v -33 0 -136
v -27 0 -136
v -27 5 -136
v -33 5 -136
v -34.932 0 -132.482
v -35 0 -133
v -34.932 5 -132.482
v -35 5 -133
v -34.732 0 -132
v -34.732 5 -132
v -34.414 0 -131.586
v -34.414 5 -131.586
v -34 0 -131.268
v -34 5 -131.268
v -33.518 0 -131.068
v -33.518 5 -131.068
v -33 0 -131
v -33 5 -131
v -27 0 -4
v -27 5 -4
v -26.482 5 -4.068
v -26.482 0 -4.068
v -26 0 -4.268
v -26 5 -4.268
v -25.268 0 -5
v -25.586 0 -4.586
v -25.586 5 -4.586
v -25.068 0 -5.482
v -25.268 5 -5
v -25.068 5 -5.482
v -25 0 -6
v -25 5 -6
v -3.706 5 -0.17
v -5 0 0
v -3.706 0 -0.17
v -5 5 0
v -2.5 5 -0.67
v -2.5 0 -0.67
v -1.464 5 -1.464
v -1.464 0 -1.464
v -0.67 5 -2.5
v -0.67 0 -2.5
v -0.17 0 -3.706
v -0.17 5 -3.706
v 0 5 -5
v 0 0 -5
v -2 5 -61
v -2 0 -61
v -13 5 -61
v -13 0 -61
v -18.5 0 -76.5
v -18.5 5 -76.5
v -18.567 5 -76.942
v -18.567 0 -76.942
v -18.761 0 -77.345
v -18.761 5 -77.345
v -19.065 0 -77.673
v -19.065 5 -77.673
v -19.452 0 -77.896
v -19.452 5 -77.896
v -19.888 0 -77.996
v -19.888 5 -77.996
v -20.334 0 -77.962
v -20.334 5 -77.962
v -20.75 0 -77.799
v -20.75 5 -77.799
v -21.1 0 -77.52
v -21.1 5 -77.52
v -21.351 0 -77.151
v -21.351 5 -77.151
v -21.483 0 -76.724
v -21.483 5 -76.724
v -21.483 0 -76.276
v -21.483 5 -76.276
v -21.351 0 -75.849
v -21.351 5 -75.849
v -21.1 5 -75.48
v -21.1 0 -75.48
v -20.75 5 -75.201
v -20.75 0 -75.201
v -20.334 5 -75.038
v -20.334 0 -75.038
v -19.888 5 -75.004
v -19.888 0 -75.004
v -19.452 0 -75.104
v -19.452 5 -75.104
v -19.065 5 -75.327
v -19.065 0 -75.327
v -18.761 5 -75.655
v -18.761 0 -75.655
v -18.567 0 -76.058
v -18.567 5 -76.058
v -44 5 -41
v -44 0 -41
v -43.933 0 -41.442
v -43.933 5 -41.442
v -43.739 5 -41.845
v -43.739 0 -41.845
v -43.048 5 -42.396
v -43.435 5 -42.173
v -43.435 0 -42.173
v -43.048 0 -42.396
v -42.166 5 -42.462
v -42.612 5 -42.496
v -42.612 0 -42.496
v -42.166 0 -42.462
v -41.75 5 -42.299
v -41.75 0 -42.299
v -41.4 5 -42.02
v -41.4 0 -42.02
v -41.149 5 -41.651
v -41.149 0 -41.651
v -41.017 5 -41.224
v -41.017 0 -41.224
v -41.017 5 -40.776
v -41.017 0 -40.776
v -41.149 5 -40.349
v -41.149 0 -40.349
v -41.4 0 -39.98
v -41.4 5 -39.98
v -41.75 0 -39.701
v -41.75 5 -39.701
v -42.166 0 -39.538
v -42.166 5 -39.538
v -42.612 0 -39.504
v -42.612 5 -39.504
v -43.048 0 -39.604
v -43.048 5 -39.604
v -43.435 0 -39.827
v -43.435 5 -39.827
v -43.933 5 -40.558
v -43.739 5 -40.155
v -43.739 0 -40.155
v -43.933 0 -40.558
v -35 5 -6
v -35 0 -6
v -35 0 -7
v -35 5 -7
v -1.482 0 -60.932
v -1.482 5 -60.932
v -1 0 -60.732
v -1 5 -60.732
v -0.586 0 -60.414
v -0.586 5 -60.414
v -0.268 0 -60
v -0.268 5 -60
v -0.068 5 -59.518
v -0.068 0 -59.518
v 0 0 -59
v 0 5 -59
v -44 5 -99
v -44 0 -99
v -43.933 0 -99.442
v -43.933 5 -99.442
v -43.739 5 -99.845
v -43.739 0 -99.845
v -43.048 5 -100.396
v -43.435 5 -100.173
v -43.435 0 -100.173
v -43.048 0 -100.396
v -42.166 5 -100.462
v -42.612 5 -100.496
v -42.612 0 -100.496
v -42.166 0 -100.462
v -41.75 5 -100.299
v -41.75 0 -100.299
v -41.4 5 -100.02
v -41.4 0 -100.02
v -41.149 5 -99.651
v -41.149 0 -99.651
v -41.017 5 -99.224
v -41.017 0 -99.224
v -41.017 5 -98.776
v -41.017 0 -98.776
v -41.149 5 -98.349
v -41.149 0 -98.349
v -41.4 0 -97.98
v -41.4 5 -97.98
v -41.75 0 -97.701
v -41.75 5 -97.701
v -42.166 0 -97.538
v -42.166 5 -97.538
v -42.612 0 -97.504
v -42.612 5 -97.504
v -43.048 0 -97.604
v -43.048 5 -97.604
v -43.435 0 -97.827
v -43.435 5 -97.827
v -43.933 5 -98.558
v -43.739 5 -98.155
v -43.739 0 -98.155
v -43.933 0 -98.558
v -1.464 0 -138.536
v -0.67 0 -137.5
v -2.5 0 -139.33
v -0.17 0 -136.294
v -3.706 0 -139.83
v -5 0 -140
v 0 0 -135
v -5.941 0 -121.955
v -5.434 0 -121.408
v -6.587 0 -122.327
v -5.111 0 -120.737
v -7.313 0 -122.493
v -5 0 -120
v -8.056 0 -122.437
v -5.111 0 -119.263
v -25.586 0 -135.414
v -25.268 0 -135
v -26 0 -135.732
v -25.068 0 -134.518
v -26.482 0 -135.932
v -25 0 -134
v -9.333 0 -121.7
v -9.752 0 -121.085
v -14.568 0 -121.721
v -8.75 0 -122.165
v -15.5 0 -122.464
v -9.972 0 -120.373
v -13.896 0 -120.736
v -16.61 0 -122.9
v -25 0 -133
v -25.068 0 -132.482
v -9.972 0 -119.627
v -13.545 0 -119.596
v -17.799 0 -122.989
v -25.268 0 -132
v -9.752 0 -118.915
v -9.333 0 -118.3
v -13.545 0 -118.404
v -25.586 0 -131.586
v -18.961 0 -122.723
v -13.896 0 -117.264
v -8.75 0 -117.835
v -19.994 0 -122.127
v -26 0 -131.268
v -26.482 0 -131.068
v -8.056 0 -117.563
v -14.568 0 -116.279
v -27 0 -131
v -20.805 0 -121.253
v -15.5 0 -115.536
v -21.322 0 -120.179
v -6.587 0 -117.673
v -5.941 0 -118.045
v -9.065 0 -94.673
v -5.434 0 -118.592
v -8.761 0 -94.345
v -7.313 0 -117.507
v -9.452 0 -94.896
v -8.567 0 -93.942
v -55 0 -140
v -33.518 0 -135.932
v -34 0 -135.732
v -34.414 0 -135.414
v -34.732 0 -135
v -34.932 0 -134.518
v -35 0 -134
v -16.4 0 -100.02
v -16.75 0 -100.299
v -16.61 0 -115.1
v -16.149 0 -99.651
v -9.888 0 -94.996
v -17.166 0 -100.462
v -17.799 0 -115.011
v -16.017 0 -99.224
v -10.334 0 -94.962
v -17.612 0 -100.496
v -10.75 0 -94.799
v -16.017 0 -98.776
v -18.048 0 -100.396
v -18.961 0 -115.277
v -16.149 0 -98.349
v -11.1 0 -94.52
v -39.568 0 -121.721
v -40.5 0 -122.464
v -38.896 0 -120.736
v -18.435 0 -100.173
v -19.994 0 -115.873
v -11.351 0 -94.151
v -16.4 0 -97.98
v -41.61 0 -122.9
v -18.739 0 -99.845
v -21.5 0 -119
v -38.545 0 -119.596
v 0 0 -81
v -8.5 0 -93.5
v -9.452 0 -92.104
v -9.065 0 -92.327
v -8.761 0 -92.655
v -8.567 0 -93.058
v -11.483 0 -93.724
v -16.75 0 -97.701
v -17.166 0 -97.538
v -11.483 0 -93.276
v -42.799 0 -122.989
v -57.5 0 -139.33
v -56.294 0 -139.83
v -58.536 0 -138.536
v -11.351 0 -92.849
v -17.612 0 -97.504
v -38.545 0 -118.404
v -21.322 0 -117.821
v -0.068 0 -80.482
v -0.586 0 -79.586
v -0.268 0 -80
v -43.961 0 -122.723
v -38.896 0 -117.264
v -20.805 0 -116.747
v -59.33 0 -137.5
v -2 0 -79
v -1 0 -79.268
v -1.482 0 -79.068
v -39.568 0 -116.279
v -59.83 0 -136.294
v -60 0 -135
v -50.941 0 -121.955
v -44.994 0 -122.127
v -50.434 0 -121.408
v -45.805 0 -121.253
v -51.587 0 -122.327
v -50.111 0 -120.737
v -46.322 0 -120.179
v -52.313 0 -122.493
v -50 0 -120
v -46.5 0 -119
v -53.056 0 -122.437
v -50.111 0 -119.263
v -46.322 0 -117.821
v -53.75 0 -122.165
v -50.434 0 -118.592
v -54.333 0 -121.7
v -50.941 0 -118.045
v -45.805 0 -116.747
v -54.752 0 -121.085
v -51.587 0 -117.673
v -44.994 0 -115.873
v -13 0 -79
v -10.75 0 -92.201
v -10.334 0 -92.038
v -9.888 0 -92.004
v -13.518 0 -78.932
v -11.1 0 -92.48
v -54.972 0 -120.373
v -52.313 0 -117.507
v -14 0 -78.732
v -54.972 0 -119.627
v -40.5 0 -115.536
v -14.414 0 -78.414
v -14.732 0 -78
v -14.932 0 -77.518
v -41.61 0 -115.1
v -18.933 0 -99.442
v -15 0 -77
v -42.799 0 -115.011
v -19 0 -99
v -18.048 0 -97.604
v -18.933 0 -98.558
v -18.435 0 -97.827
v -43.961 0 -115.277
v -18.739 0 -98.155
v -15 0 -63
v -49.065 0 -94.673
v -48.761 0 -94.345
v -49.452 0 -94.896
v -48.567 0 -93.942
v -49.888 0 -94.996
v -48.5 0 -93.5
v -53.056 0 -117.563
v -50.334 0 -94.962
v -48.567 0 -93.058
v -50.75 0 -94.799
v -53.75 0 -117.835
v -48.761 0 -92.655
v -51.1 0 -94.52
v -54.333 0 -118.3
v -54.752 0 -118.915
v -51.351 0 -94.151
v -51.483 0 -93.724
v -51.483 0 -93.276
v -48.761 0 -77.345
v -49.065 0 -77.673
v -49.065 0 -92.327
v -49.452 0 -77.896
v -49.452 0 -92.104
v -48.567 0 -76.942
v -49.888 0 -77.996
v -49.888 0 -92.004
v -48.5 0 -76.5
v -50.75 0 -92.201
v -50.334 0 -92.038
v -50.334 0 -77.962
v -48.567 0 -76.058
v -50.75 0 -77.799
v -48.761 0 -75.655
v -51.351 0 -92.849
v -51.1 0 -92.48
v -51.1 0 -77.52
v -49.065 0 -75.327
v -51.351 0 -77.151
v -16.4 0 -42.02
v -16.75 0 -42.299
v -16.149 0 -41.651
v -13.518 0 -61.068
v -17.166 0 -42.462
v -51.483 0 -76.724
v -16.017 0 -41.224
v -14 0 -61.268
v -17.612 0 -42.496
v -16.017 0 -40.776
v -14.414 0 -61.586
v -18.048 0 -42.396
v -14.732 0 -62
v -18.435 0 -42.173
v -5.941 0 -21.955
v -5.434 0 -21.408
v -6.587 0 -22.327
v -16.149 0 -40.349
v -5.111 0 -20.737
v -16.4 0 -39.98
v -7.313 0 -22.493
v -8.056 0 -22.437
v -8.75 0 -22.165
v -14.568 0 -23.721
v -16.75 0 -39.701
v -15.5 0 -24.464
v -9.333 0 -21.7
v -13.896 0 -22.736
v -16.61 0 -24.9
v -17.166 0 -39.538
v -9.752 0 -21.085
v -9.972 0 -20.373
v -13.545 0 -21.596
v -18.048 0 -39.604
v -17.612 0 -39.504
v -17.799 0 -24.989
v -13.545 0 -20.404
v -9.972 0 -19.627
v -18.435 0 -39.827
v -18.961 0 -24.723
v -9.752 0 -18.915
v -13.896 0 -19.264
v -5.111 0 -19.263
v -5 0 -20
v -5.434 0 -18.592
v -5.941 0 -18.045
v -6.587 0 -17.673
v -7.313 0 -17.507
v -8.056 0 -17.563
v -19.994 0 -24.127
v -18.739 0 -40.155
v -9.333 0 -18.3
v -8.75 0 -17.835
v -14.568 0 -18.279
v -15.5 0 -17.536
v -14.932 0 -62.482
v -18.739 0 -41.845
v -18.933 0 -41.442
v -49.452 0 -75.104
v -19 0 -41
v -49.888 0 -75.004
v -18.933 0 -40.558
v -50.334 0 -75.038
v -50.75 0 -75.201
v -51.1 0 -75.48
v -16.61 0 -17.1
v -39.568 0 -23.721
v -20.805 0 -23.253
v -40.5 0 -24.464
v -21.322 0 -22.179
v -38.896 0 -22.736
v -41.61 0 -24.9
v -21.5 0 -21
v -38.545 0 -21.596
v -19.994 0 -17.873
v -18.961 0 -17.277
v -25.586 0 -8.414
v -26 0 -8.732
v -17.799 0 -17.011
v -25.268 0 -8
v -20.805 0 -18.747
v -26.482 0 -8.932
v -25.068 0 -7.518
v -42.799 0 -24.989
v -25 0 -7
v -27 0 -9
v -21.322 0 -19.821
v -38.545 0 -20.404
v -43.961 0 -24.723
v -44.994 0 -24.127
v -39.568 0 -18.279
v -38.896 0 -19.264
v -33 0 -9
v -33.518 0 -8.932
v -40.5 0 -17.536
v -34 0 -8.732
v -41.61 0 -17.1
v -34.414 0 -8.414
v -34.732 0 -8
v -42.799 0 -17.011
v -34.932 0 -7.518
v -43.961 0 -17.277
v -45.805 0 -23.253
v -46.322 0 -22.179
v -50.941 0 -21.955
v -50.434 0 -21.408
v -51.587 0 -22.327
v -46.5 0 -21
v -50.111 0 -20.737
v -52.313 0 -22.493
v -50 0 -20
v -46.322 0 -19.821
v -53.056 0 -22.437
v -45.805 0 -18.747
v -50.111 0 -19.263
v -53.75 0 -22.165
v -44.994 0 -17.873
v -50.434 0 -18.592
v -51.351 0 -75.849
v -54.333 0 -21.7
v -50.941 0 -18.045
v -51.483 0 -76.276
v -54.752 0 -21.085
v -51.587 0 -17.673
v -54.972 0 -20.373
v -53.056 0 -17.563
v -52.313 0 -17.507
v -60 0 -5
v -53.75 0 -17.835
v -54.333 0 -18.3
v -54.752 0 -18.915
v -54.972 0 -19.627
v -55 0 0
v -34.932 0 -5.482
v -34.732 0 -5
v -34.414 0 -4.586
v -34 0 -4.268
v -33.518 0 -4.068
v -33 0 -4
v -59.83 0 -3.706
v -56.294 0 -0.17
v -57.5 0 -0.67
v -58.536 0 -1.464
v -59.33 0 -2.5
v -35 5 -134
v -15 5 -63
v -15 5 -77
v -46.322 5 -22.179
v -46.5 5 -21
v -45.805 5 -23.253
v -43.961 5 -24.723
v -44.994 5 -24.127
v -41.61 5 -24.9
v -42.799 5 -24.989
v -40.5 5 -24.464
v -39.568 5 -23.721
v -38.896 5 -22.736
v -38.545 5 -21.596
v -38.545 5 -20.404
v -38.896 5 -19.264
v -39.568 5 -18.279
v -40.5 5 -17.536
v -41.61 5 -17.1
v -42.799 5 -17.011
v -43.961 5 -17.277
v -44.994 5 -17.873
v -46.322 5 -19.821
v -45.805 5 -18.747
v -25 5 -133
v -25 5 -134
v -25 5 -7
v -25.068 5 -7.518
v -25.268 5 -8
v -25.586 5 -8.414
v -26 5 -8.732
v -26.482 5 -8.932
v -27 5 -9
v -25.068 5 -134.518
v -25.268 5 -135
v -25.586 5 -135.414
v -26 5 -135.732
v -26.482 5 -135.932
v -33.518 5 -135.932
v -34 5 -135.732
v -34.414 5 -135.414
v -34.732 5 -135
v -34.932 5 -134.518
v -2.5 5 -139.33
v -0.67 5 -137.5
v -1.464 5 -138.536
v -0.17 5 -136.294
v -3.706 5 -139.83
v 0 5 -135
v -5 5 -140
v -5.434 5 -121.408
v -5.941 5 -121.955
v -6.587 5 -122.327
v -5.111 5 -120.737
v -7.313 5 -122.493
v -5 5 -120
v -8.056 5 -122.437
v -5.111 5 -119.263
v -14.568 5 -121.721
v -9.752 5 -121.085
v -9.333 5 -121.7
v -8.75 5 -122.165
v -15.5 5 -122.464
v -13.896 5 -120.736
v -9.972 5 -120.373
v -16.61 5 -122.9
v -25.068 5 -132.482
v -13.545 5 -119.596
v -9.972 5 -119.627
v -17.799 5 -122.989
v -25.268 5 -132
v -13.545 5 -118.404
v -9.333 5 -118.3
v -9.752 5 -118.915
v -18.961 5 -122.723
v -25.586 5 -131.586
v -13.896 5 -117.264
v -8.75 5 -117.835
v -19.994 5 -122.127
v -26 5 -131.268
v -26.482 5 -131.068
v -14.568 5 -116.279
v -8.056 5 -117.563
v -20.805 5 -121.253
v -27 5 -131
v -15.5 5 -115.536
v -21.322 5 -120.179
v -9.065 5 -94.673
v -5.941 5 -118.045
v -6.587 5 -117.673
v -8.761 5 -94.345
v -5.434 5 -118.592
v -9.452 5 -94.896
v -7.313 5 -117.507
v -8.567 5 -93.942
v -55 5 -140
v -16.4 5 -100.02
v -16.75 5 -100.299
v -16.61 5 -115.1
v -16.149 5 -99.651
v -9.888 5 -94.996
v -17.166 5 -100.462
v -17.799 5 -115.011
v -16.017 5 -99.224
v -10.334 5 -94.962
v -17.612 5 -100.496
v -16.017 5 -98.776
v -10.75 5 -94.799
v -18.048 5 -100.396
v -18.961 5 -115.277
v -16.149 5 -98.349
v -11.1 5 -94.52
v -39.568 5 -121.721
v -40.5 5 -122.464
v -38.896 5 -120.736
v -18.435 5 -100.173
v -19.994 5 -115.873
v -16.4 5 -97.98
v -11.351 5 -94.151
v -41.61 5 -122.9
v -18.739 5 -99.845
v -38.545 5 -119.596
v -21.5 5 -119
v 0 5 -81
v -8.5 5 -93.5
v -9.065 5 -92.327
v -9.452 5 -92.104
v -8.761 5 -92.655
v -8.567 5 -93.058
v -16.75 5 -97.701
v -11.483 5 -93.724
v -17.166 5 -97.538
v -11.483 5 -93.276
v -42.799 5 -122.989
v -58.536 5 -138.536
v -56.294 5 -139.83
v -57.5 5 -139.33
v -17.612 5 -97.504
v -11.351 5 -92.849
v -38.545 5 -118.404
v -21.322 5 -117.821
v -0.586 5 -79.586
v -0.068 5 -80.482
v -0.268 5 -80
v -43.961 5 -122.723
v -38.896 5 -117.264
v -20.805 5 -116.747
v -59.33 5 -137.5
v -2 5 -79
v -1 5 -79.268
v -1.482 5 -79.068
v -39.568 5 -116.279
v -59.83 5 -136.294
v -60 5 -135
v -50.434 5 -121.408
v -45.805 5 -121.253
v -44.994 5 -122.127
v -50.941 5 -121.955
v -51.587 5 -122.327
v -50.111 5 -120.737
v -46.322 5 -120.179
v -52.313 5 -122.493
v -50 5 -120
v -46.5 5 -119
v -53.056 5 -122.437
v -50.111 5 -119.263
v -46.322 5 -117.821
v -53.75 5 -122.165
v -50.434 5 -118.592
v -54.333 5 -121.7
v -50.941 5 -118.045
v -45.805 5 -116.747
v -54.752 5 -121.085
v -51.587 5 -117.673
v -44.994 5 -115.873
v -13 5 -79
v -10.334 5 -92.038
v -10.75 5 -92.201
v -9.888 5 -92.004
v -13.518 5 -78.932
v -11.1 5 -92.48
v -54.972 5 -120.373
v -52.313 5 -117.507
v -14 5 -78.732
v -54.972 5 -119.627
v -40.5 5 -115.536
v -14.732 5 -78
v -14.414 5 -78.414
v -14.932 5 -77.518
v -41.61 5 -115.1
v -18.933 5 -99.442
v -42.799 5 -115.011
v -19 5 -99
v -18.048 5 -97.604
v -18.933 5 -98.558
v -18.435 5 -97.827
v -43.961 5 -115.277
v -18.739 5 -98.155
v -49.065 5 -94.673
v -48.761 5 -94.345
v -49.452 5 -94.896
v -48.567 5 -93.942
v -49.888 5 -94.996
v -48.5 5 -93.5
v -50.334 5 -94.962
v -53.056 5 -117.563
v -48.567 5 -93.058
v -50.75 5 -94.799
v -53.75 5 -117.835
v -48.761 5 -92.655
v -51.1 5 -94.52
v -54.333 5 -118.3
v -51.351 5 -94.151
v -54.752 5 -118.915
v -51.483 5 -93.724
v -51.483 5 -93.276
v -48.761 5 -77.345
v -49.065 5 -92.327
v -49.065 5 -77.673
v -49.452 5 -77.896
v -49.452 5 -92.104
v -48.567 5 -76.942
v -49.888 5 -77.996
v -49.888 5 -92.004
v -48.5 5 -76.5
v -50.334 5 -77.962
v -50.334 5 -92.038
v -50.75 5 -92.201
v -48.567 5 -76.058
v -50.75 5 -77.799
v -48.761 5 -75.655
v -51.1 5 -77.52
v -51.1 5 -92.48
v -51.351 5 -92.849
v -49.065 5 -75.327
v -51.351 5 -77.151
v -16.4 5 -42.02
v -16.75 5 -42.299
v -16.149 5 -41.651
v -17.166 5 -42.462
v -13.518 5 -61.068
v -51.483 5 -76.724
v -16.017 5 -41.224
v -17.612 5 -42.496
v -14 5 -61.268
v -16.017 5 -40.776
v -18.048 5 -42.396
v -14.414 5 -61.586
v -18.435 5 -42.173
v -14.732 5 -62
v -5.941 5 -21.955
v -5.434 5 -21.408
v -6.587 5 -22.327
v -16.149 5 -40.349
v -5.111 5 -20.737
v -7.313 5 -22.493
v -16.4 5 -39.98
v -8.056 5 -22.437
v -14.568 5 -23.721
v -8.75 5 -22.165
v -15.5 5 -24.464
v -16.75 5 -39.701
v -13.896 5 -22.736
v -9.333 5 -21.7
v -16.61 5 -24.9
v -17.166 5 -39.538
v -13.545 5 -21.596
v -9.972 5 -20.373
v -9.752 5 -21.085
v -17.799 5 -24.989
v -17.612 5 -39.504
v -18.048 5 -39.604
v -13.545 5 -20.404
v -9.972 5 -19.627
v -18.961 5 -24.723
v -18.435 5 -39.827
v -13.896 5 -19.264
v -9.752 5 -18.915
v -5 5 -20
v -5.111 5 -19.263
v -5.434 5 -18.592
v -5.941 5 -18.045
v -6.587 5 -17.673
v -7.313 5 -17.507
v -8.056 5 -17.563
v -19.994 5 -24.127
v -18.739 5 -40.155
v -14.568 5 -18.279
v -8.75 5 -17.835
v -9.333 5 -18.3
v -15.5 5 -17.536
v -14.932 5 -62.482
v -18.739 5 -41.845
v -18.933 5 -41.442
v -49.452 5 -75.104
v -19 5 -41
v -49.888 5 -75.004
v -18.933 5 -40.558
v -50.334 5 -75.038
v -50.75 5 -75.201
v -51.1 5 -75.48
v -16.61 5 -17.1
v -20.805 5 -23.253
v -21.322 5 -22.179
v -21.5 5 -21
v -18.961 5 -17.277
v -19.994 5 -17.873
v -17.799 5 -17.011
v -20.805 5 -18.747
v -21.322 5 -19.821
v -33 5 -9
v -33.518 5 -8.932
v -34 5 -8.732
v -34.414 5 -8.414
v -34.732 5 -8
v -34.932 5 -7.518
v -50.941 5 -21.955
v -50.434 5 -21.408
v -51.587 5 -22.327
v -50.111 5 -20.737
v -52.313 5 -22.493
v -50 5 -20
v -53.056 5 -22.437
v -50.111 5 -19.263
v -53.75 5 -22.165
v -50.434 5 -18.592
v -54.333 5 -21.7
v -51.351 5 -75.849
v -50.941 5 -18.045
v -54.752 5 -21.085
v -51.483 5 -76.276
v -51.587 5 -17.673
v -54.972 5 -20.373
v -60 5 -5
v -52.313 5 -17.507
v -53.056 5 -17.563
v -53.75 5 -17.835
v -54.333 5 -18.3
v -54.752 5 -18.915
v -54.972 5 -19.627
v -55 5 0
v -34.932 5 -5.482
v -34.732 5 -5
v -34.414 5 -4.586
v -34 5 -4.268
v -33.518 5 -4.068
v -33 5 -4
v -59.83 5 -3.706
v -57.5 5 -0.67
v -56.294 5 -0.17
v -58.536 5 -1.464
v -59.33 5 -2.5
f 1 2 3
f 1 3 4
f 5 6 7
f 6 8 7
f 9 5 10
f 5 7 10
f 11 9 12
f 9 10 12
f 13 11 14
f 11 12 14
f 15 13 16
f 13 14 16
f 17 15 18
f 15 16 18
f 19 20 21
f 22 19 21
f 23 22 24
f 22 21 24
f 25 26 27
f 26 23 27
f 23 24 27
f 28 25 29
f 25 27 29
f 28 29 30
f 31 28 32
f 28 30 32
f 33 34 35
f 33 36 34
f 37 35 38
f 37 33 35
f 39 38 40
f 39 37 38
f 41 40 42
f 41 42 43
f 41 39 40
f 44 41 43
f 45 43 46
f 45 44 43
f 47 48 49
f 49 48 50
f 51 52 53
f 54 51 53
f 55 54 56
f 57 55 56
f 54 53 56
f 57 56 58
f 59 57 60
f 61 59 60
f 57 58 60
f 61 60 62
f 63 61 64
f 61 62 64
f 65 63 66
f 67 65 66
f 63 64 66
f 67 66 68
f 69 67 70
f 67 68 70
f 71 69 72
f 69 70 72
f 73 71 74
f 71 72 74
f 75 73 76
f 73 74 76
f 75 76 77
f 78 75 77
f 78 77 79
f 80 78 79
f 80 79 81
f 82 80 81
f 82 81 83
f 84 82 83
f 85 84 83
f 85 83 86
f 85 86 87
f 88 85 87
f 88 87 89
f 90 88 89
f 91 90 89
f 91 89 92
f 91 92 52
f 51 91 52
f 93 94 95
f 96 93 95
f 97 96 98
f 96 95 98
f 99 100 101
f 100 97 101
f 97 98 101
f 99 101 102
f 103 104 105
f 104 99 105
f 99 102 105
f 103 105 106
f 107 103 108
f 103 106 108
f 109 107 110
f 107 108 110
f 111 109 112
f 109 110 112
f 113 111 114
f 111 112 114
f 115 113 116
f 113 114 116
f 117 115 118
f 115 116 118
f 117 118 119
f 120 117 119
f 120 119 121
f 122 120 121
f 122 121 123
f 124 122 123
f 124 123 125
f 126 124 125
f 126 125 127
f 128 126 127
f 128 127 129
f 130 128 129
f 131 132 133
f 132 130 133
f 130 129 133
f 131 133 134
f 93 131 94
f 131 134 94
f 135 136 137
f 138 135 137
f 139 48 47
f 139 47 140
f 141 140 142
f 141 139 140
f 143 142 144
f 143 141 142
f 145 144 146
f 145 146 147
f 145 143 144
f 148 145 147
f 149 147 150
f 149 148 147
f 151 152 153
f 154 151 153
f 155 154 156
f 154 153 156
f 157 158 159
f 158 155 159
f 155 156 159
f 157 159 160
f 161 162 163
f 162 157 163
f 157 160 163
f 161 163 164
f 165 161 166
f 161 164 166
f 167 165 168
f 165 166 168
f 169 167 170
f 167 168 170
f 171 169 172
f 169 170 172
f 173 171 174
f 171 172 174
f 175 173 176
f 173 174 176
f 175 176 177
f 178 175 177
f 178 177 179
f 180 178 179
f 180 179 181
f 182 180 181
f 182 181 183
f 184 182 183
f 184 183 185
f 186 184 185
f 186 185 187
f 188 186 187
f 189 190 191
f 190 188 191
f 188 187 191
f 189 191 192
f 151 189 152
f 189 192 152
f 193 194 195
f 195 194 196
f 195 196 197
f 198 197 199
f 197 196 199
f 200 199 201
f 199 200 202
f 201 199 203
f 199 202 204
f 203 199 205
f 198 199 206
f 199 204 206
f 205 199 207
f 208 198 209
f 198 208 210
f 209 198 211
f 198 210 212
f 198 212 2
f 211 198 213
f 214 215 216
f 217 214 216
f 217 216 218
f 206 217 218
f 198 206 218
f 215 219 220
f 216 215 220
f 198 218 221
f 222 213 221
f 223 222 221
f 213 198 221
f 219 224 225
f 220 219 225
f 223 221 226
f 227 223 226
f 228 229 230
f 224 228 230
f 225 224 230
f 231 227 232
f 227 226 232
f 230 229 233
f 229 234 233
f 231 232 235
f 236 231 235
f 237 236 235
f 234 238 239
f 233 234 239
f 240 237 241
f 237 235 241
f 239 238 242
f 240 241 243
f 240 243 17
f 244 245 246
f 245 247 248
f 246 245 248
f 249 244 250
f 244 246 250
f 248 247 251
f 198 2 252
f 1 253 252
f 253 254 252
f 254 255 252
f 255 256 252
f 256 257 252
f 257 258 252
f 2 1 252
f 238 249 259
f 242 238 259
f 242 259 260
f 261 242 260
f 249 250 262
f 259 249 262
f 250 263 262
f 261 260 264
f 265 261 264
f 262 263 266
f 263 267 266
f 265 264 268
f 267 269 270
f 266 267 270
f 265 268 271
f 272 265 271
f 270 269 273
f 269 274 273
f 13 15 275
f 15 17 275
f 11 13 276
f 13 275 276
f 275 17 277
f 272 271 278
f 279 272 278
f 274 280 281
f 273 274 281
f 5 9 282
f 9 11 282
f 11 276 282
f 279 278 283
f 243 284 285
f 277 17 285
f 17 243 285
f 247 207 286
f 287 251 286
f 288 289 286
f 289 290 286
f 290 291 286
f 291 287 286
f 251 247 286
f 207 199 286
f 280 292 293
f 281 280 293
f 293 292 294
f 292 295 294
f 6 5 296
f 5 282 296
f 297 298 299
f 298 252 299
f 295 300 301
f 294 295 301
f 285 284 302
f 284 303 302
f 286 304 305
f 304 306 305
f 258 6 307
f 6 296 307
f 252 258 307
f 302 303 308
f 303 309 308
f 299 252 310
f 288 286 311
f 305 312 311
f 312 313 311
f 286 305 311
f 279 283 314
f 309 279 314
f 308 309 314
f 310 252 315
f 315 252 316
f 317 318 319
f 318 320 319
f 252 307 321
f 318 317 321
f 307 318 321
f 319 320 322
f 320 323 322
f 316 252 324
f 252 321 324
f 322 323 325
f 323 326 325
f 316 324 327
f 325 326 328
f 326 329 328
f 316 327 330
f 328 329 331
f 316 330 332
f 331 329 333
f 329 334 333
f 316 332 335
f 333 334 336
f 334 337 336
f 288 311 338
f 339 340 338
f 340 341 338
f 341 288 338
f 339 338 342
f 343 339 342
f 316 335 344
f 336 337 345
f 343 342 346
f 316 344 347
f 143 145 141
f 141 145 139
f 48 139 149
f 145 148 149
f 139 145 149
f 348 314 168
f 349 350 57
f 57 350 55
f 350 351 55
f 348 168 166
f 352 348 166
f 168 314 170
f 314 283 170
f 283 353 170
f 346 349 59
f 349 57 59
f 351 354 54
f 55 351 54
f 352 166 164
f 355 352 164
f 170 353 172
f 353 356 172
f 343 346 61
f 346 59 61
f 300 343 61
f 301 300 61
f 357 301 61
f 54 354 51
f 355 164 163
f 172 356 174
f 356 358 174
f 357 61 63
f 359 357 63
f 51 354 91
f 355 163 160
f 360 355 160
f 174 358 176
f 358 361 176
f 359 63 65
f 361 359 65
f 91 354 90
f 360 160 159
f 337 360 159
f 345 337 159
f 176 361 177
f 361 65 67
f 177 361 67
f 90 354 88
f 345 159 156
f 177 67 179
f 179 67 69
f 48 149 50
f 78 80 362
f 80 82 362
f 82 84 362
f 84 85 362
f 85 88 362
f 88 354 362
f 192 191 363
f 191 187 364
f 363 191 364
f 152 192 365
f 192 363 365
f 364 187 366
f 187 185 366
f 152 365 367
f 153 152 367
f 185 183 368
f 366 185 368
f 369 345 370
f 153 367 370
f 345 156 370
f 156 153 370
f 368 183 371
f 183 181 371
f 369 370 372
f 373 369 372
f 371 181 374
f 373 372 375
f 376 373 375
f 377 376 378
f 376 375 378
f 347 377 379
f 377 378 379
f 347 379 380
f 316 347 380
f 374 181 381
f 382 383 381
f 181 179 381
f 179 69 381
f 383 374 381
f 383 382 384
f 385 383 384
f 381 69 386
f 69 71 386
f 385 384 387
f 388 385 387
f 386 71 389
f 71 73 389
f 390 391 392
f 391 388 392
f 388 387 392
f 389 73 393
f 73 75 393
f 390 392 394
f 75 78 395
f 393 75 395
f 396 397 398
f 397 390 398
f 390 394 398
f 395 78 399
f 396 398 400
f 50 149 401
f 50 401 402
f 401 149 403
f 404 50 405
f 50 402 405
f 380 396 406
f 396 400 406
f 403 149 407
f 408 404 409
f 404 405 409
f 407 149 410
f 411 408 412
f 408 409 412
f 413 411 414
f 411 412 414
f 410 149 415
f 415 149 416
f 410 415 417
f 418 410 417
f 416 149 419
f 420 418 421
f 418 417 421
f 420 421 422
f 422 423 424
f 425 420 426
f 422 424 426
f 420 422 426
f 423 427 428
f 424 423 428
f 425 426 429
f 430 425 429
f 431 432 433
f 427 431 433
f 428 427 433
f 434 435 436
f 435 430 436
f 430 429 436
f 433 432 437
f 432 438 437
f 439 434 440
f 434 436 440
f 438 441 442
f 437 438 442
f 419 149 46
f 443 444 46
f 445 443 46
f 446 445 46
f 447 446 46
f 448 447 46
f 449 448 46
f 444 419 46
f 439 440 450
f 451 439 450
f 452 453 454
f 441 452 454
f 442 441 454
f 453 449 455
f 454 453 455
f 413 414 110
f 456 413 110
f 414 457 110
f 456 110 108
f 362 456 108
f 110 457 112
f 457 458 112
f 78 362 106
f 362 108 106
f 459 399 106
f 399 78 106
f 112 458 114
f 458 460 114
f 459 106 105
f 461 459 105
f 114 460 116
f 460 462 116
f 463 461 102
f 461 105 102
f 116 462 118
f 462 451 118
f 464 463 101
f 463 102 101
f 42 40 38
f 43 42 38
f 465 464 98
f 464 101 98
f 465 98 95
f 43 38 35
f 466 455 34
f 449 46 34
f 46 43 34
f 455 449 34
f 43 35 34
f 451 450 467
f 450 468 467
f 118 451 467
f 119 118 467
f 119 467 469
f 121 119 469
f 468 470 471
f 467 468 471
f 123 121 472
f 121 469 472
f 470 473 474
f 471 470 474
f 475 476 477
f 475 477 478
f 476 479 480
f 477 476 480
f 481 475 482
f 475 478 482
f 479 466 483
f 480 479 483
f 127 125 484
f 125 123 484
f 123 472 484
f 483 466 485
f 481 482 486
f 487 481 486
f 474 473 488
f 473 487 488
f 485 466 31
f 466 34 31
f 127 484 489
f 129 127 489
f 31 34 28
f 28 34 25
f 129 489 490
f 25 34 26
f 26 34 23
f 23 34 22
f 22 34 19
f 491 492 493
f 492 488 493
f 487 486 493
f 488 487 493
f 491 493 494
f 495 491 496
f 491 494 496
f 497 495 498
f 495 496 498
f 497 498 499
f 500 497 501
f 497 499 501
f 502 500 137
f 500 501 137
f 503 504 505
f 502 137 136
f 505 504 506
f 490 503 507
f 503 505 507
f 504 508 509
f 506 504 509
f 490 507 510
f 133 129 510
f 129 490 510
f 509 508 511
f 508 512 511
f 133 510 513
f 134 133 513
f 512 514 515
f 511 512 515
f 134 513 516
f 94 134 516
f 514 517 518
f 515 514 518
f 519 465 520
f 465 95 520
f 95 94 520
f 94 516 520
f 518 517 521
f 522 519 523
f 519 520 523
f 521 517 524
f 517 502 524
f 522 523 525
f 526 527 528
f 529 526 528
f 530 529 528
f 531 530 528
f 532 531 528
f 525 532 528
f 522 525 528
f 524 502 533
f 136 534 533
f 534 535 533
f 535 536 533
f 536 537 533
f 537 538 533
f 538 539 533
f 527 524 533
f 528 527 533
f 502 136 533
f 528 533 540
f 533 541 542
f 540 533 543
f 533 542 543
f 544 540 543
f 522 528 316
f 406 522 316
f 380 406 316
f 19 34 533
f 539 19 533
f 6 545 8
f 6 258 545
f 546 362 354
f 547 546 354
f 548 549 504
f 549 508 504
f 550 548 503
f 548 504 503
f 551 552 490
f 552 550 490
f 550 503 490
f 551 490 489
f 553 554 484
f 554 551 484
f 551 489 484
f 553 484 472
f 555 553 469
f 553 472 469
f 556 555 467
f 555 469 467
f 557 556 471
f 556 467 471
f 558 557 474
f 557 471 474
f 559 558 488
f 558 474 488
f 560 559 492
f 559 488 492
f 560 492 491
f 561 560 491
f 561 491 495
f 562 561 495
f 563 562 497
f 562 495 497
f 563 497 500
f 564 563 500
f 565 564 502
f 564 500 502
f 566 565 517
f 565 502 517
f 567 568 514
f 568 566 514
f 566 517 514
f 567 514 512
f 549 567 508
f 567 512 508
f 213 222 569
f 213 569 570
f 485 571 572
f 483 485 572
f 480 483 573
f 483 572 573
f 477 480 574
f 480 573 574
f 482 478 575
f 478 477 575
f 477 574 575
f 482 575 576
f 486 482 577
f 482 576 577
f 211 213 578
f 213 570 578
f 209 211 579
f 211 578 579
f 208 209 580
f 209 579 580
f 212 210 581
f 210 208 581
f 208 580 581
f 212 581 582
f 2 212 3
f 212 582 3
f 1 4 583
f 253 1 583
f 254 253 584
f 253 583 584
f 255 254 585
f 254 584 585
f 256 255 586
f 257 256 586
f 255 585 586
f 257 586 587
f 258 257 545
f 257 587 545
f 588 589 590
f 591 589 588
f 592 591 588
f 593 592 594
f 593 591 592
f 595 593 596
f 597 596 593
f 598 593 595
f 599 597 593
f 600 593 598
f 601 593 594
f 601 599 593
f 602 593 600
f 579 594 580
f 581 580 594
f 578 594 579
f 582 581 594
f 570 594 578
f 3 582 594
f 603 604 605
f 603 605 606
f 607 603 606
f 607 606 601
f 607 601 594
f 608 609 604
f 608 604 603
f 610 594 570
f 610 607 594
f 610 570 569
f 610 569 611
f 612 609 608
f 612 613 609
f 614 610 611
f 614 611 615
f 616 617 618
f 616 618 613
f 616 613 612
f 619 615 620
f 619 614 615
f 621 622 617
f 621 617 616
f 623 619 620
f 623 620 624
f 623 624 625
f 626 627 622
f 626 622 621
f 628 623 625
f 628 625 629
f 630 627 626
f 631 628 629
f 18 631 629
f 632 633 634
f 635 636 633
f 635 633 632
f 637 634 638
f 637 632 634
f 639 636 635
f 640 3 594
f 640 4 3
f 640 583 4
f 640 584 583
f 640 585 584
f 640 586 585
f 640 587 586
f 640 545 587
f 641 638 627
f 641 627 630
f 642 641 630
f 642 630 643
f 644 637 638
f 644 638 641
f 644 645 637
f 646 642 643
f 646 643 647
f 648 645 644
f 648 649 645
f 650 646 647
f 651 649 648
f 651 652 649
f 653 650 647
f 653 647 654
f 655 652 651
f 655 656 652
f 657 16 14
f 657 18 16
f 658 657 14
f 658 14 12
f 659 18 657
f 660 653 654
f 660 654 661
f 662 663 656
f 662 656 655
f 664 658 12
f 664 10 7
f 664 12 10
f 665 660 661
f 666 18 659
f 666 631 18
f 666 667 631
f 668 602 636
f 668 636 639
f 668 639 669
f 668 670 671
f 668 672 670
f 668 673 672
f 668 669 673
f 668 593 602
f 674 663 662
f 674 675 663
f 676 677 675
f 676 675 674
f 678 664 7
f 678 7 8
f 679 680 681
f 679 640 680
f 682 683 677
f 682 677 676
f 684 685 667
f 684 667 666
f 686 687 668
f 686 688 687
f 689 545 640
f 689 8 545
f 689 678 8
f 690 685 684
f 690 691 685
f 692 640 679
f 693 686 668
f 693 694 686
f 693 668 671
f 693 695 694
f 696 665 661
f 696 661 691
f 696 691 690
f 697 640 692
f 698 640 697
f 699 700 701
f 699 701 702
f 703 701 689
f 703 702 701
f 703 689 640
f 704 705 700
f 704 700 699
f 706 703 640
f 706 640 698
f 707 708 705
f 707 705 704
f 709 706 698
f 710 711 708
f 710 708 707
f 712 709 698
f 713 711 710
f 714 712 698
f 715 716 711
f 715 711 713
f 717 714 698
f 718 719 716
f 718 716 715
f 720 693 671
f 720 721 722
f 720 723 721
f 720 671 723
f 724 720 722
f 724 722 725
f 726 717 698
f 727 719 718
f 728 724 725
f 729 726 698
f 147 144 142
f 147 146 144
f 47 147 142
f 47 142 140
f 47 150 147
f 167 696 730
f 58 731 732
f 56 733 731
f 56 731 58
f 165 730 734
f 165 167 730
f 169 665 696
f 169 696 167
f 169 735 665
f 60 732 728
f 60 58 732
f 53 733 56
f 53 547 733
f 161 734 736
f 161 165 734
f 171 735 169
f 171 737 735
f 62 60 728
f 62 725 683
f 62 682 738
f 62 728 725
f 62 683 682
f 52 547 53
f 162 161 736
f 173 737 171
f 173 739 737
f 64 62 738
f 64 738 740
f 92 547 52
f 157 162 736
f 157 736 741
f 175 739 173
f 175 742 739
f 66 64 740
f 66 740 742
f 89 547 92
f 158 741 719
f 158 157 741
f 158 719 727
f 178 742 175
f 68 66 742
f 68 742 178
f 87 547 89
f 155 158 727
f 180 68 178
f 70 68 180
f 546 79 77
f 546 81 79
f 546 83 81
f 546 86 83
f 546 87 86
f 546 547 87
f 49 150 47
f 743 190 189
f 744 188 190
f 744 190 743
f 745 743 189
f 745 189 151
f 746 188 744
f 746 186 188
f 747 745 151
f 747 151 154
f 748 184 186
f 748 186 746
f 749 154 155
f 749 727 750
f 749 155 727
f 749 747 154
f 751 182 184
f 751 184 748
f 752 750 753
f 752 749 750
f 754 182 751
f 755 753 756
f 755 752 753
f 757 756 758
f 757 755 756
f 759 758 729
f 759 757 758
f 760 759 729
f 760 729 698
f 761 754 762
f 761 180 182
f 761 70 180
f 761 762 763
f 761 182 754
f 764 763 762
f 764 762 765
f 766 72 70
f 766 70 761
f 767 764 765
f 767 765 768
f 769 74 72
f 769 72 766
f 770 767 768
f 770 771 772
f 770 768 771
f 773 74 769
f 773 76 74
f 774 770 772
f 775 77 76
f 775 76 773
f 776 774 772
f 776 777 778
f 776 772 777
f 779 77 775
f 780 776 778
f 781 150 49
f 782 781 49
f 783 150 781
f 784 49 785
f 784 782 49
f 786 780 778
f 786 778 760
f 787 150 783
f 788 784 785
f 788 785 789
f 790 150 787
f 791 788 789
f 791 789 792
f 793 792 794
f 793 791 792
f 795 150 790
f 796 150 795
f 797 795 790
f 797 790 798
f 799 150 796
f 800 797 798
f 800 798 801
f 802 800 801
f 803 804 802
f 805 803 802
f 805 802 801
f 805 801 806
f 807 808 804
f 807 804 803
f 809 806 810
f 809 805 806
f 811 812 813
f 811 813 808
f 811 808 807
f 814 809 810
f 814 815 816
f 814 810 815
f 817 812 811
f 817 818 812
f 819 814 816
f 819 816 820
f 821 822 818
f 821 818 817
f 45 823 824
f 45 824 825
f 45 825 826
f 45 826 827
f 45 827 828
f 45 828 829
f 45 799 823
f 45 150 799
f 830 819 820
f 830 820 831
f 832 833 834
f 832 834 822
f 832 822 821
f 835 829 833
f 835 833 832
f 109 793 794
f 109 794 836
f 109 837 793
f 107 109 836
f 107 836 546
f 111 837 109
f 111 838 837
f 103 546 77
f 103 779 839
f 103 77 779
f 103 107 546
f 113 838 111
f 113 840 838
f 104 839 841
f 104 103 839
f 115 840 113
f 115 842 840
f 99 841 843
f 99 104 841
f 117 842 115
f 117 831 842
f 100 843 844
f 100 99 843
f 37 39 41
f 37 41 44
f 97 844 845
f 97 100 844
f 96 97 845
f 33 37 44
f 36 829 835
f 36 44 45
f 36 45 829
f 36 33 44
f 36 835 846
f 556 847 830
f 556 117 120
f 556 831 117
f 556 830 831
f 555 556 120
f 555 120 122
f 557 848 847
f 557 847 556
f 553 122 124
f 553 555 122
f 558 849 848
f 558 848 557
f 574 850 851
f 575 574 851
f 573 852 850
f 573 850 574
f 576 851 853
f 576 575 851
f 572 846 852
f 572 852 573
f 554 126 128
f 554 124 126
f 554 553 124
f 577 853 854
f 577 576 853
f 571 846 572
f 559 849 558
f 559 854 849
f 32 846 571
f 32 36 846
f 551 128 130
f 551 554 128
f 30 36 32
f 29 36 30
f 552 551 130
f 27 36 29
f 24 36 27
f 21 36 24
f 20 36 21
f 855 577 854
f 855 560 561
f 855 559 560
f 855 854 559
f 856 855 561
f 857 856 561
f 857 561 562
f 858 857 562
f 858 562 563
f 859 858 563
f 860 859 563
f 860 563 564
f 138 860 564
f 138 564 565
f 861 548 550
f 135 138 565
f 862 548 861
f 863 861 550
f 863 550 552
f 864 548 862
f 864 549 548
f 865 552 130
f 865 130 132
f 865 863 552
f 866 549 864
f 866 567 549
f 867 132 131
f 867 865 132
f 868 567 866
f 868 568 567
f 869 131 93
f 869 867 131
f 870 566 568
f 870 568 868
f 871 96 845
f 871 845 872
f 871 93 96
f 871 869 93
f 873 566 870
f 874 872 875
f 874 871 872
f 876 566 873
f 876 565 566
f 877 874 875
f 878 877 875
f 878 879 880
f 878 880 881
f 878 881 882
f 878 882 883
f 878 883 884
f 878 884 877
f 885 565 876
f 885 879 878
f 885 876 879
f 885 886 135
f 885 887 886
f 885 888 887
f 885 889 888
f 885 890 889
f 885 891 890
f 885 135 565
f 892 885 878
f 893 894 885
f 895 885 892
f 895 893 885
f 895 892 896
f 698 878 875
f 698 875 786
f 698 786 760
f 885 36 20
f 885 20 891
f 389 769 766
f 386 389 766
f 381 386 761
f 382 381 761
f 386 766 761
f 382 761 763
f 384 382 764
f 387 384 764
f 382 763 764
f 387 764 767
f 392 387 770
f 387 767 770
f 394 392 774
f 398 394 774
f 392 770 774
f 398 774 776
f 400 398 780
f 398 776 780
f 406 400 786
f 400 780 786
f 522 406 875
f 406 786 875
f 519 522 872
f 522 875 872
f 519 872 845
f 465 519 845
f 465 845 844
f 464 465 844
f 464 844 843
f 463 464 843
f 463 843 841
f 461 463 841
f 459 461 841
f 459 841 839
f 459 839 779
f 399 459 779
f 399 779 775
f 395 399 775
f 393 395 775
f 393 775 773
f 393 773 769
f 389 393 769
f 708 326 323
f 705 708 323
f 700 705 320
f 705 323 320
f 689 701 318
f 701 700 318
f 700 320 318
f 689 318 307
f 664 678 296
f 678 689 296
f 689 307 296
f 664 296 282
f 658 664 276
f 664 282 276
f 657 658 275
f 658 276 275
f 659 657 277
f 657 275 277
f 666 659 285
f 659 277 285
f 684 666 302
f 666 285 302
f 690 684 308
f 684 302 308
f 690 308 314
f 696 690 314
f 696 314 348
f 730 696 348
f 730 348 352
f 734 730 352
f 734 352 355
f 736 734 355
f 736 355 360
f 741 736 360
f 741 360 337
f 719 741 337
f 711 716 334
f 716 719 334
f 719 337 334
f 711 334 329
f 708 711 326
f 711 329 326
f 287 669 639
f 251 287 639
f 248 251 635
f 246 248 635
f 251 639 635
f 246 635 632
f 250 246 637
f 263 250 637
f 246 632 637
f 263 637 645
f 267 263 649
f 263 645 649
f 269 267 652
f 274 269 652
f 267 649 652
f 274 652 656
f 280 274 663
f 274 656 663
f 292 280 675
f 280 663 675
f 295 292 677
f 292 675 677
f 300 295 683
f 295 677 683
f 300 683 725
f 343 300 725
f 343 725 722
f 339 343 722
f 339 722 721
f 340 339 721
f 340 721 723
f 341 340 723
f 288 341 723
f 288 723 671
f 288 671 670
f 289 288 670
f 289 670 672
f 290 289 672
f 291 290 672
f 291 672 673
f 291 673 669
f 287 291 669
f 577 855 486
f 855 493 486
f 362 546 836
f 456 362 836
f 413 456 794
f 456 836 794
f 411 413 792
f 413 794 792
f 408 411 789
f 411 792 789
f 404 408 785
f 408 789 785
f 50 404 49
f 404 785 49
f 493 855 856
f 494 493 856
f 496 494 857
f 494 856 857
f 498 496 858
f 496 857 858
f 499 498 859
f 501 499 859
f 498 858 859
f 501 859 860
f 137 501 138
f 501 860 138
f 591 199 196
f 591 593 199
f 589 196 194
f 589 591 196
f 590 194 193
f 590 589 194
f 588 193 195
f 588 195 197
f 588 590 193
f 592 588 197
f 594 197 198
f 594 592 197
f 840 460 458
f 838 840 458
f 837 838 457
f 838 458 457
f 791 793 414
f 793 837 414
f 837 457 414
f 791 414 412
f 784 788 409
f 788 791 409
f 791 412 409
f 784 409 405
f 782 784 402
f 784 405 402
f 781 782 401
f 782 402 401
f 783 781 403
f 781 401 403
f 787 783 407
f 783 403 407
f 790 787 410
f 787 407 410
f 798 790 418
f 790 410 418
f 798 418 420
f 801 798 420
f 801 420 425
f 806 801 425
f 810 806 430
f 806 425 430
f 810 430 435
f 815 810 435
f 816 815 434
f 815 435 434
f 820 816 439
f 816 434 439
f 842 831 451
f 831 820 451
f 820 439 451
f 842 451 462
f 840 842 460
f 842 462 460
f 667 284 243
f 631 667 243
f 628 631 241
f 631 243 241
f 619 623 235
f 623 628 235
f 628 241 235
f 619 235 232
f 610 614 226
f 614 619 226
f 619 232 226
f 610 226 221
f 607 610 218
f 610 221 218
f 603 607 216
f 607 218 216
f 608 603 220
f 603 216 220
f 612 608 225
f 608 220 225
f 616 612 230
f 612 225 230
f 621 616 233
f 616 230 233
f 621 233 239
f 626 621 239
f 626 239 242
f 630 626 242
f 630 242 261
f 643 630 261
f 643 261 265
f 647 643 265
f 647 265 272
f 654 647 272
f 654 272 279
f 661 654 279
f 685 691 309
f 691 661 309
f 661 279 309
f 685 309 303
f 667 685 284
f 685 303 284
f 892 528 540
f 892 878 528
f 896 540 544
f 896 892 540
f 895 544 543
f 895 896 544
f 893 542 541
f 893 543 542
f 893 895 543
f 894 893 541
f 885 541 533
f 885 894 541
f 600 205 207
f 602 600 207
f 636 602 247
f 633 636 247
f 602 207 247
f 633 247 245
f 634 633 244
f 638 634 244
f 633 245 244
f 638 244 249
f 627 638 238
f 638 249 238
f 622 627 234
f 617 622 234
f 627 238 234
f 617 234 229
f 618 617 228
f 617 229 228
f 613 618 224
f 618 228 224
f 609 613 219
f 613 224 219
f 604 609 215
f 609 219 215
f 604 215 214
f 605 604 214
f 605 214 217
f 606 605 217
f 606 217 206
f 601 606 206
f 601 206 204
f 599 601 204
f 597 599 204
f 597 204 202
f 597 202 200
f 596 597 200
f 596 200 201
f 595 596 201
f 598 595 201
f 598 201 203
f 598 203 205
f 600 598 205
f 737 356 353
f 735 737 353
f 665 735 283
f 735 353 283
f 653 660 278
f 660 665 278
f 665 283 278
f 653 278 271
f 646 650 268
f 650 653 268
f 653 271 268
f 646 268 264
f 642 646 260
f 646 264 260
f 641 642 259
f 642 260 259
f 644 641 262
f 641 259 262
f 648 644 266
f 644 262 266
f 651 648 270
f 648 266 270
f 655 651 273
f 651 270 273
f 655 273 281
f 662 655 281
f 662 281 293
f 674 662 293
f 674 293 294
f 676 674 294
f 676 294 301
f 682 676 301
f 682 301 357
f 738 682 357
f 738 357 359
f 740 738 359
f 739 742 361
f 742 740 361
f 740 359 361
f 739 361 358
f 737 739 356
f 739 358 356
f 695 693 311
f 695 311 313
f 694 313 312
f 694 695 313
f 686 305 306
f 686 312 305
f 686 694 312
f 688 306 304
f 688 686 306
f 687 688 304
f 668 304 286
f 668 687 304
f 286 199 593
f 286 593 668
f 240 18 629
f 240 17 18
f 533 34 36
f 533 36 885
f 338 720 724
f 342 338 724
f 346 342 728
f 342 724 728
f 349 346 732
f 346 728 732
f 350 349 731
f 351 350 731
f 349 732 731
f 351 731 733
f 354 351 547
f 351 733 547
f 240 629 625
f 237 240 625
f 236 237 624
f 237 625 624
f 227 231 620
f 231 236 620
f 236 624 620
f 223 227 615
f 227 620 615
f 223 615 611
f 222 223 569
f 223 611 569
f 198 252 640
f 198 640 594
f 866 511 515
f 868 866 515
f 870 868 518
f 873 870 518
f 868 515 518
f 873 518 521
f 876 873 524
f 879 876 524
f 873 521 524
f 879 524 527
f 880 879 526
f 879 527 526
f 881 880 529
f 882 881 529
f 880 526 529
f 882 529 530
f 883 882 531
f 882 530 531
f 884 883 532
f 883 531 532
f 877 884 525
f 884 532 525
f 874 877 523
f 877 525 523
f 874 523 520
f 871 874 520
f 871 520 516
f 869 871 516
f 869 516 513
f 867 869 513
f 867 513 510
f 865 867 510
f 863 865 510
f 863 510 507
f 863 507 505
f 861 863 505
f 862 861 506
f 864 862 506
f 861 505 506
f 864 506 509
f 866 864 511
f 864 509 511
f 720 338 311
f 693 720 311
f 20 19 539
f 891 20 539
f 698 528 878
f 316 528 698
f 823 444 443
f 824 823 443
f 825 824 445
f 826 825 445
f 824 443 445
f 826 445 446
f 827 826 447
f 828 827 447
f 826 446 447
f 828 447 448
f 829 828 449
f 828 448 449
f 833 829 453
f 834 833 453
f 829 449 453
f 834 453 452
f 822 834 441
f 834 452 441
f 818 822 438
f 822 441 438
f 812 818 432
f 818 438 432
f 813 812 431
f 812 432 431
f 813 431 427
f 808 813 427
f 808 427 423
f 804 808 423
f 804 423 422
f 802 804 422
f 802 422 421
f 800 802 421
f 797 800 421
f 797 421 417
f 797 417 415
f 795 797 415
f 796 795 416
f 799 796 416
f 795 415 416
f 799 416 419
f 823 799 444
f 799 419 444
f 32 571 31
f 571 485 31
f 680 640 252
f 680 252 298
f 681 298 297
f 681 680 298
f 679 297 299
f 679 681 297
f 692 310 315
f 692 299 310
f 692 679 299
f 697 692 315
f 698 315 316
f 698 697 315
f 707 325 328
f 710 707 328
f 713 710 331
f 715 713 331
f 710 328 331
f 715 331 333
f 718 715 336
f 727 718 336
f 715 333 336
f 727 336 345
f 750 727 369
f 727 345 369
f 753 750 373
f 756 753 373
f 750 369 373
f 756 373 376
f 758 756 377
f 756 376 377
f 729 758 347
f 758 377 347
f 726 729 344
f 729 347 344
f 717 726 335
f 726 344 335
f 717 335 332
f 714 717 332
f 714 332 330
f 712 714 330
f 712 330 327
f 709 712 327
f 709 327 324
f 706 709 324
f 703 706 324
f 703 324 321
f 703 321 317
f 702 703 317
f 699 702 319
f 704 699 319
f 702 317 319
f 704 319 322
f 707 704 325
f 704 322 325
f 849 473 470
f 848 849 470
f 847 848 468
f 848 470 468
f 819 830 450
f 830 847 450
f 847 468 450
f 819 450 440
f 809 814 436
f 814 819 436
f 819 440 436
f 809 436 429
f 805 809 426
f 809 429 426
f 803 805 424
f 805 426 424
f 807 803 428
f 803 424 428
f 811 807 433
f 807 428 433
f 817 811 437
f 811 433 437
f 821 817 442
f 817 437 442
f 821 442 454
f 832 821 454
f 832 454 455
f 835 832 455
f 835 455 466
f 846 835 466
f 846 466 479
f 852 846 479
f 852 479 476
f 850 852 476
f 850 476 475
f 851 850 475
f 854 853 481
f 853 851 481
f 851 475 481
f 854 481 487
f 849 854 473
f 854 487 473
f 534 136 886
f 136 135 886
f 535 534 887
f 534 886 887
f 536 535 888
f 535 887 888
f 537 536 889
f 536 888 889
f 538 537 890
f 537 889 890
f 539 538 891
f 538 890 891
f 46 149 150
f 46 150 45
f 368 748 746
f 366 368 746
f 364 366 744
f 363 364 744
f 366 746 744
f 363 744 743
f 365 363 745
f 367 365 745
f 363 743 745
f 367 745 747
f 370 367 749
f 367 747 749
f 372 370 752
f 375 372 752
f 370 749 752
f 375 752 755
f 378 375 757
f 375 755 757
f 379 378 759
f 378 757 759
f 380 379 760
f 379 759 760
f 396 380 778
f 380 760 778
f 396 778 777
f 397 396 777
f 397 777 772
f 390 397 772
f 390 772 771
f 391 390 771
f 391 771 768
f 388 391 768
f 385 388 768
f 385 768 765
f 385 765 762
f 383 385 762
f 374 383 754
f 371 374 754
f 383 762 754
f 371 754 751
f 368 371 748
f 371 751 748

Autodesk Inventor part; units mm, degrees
ref_plane "YZ Plane" through (0, 0, 0) normal (1, 0, 0) x (0, 1, 0)
ref_plane "XZ Plane" through (0, 0, 0) normal (0, 1, 0) x (-1, 0, 0)
ref_plane "XY Plane" through (0, 0, 0) normal (0, 0, 1) x (1, 0, 0)
sketch "Sketch1" plane through (0, 0, 0) normal (0, 1, 0) x (-1, 0, 0)
  line L0 (0, 0) -> (60, 0)
  line L1 (60, 0) -> (60, -140)
  line L2 (60, -140) -> (0, -140)
  line L3 (0, -140) -> (0, 0)
  line L4 (30, -20.8594) -> (30, -183.1932) construction
  line L5 (42.5, -21.7206) -> (42.5, -191.0157) construction
  line L6 (17.5, -21.7206) -> (17.5, -184.1979) construction
  circle A0 centre (42.5, -21) radius 4
  circle A1 centre (42.5, -41) radius 1.5
  circle A2 centre (42.5, -99) radius 1.5
  circle A3 centre (42.5, -119) radius 4
  circle A4 centre (17.5, -99) radius 1.5
  circle A5 centre (17.5, -119) radius 4
  circle A6 centre (17.5, -41) radius 1.5
  circle A7 centre (17.5, -21) radius 4
  dimension "d0" = 140
  dimension "d1" = 60
  dimension "d2" = 30
  dimension "d3" = 12.5
  dimension "d4" = 12.5
  dimension "d5" = 8
  dimension "d6" = 3
  dimension "d7" = 3
  dimension "d8" = 8
  dimension "d9" = 3
  dimension "d10" = 8
  dimension "d11" = 3
  dimension "d13" = 20
  dimension "d14" = 20
  dimension "d15" = 20
  dimension "d16" = 20
  dimension "d17" = 21
  dimension "d18" = 21
  dimension "d19" = 21
  dimension "d20" = 21
  dimension "d74" = 8
extrude "Extrusion1" add sketch "Sketch1" along normal blind 5
sketch "Sketch2" plane through (0, 0, 0) normal (0, -1, 0) x (1, 0, 0)
  circle A0 centre (-7.5, -20) radius 2.5
  circle A1 centre (-7.5, -120) radius 2.5
  circle A2 centre (-52.5, -20) radius 2.5
  circle A3 centre (-52.5, -120) radius 2.5
  line L0 (-60, 0) -> (0, 0) projected
  line L1 (0, 0) -> (0, -140) projected
  line L2 (-60, -140) -> (-60, 0) projected
  line L3 (0, -140) -> (-60, -140) projected
  dimension "d23" = 5
  dimension "d24" = 5
  dimension "d25" = 5
  dimension "d26" = 5
  dimension "d27" = 20
  dimension "d28" = 7.5
  dimension "d29" = 20
  dimension "d30" = 7.5
  dimension "d31" = 20
  dimension "d32" = 7.5
  dimension "d33" = 20
  dimension "d34" = 7.5
extrude "Extrusion2" cut sketch "Sketch2" against normal blind 10 contours A0 | A1 | A2 | A3
sketch "Sketch3" plane through (0, 0, 0) normal (0, -1, 0) x (1, 0, 0)
  line L0 (-25, -4) -> (-35, -4)
  line L1 (-35, -4) -> (-35, -9)
  line L2 (-35, -9) -> (-25, -9)
  line L3 (-25, -9) -> (-25, -4)
  line L4 (9.3646, -70) -> (-76.8402, -70) construction
  line L5 (-60, 0) -> (0, 0) projected
  line L6 (0, 0) -> (0, -140) projected
  line L7 (-25, -136) -> (-35, -136)
  line L8 (-35, -136) -> (-35, -131)
  line L9 (-35, -131) -> (-25, -131)
  line L10 (-25, -131) -> (-25, -136)
  dimension "d40" = 70
  dimension "d41" = 10
  dimension "d42" = 4
  dimension "d43" = 5
  dimension "d44" = 25
extrude "Extrusion3" cut sketch "Sketch3" against normal blind 10
fillet "Fillet2" radius 5 4 edges at (-60, 2.5, 0) (-60, 2.5, -140) (0, 2.5, -140) (0, 2.5, 0)
sketch "Sketch4" plane through (0, 5, 0) normal (0, 1, 0) x (1, 0, 0)
  circle A0 centre (-50, 76.5) radius 1.5
  circle A1 centre (-50, 93.5) radius 1.5
  circle A2 centre (-20, 76.5) radius 1.5
  circle A3 centre (-10, 93.5) radius 1.5
  line L0 (-5, 140) -> (-55, 140) projected
  line L1 (-60, 135) -> (-60, 5) projected
  line L2 (0, 5) -> (0, 135) projected
  point P0 (0, 0)
  dimension "d49" = 3
  dimension "d50" = 3
  dimension "d51" = 3
  dimension "d52" = 3
  dimension "d53" = 46.5
  dimension "d54" = 46.5
  dimension "d55" = 63.5
  dimension "d56" = 63.5
  dimension "d57" = 10
  dimension "d59" = 10
  dimension "d71" = 10
  dimension "d72" = 20
extrude "Extrusion4" cut sketch "Sketch4" against normal blind 10
sketch "Sketch5" plane through (0, 0, 0) normal (0, -1, 0) x (1, 0, 0)
  line L0 (59.7124, -61) -> (87.7124, -61) projected
  line L1 (87.7124, -79) -> (59.7124, -79) projected
  line L2 (5, -61) -> (-15, -61)
  line L3 (-15, -61) -> (-15, -79)
  line L4 (-15, -79) -> (5, -79)
  line L5 (5, -79) -> (5, -61)
  line L6 (0, -5) -> (0, -135) projected
  point P0 (0, 0)
  dimension "d66" = 15
  dimension "d67" = 5
extrude "Extrusion5" cut sketch "Sketch5" against normal blind 10
fillet "Fillet3" radius 2 4 edges at (0, 2.5, -79) (0, 2.5, -61) (-15, 2.5, -79) (-15, 2.5, -61)
fillet "Fillet4" radius 2 8 edges at (-25, 2.5, -9) (-25, 2.5, -4) (-35, 2.5, -4) (-35, 2.5, -9) (-35, 2.5, -136) (-35, 2.5, -131) (-25, 2.5, -131) (-25, 2.5, -136)
equation "\"d2\" = 0.5 * d1"
equation "\"d4\" = d3"
equation "\"d8\" = d5"
equation "\"d10\" = d5"
equation "\"d14\" = d13"
equation "\"d15\" = d13"
equation "\"d16\" = d13"
equation "\"d18\" = d17"
equation "\"d19\" = d17"
equation "\"d20\" = d17"
equation "\"d29\" = d27"
equation "\"d30\" = d28"
equation "\"d31\" = d27"
equation "\"d32\" = d28"
equation "\"d33\" = d27"
equation "\"d34\" = d28"
equation "\"d50\" = d49"
equation "\"d51\" = d49"
equation "\"d52\" = d49"
properties part number "Y-Axis_front_plate_top"
